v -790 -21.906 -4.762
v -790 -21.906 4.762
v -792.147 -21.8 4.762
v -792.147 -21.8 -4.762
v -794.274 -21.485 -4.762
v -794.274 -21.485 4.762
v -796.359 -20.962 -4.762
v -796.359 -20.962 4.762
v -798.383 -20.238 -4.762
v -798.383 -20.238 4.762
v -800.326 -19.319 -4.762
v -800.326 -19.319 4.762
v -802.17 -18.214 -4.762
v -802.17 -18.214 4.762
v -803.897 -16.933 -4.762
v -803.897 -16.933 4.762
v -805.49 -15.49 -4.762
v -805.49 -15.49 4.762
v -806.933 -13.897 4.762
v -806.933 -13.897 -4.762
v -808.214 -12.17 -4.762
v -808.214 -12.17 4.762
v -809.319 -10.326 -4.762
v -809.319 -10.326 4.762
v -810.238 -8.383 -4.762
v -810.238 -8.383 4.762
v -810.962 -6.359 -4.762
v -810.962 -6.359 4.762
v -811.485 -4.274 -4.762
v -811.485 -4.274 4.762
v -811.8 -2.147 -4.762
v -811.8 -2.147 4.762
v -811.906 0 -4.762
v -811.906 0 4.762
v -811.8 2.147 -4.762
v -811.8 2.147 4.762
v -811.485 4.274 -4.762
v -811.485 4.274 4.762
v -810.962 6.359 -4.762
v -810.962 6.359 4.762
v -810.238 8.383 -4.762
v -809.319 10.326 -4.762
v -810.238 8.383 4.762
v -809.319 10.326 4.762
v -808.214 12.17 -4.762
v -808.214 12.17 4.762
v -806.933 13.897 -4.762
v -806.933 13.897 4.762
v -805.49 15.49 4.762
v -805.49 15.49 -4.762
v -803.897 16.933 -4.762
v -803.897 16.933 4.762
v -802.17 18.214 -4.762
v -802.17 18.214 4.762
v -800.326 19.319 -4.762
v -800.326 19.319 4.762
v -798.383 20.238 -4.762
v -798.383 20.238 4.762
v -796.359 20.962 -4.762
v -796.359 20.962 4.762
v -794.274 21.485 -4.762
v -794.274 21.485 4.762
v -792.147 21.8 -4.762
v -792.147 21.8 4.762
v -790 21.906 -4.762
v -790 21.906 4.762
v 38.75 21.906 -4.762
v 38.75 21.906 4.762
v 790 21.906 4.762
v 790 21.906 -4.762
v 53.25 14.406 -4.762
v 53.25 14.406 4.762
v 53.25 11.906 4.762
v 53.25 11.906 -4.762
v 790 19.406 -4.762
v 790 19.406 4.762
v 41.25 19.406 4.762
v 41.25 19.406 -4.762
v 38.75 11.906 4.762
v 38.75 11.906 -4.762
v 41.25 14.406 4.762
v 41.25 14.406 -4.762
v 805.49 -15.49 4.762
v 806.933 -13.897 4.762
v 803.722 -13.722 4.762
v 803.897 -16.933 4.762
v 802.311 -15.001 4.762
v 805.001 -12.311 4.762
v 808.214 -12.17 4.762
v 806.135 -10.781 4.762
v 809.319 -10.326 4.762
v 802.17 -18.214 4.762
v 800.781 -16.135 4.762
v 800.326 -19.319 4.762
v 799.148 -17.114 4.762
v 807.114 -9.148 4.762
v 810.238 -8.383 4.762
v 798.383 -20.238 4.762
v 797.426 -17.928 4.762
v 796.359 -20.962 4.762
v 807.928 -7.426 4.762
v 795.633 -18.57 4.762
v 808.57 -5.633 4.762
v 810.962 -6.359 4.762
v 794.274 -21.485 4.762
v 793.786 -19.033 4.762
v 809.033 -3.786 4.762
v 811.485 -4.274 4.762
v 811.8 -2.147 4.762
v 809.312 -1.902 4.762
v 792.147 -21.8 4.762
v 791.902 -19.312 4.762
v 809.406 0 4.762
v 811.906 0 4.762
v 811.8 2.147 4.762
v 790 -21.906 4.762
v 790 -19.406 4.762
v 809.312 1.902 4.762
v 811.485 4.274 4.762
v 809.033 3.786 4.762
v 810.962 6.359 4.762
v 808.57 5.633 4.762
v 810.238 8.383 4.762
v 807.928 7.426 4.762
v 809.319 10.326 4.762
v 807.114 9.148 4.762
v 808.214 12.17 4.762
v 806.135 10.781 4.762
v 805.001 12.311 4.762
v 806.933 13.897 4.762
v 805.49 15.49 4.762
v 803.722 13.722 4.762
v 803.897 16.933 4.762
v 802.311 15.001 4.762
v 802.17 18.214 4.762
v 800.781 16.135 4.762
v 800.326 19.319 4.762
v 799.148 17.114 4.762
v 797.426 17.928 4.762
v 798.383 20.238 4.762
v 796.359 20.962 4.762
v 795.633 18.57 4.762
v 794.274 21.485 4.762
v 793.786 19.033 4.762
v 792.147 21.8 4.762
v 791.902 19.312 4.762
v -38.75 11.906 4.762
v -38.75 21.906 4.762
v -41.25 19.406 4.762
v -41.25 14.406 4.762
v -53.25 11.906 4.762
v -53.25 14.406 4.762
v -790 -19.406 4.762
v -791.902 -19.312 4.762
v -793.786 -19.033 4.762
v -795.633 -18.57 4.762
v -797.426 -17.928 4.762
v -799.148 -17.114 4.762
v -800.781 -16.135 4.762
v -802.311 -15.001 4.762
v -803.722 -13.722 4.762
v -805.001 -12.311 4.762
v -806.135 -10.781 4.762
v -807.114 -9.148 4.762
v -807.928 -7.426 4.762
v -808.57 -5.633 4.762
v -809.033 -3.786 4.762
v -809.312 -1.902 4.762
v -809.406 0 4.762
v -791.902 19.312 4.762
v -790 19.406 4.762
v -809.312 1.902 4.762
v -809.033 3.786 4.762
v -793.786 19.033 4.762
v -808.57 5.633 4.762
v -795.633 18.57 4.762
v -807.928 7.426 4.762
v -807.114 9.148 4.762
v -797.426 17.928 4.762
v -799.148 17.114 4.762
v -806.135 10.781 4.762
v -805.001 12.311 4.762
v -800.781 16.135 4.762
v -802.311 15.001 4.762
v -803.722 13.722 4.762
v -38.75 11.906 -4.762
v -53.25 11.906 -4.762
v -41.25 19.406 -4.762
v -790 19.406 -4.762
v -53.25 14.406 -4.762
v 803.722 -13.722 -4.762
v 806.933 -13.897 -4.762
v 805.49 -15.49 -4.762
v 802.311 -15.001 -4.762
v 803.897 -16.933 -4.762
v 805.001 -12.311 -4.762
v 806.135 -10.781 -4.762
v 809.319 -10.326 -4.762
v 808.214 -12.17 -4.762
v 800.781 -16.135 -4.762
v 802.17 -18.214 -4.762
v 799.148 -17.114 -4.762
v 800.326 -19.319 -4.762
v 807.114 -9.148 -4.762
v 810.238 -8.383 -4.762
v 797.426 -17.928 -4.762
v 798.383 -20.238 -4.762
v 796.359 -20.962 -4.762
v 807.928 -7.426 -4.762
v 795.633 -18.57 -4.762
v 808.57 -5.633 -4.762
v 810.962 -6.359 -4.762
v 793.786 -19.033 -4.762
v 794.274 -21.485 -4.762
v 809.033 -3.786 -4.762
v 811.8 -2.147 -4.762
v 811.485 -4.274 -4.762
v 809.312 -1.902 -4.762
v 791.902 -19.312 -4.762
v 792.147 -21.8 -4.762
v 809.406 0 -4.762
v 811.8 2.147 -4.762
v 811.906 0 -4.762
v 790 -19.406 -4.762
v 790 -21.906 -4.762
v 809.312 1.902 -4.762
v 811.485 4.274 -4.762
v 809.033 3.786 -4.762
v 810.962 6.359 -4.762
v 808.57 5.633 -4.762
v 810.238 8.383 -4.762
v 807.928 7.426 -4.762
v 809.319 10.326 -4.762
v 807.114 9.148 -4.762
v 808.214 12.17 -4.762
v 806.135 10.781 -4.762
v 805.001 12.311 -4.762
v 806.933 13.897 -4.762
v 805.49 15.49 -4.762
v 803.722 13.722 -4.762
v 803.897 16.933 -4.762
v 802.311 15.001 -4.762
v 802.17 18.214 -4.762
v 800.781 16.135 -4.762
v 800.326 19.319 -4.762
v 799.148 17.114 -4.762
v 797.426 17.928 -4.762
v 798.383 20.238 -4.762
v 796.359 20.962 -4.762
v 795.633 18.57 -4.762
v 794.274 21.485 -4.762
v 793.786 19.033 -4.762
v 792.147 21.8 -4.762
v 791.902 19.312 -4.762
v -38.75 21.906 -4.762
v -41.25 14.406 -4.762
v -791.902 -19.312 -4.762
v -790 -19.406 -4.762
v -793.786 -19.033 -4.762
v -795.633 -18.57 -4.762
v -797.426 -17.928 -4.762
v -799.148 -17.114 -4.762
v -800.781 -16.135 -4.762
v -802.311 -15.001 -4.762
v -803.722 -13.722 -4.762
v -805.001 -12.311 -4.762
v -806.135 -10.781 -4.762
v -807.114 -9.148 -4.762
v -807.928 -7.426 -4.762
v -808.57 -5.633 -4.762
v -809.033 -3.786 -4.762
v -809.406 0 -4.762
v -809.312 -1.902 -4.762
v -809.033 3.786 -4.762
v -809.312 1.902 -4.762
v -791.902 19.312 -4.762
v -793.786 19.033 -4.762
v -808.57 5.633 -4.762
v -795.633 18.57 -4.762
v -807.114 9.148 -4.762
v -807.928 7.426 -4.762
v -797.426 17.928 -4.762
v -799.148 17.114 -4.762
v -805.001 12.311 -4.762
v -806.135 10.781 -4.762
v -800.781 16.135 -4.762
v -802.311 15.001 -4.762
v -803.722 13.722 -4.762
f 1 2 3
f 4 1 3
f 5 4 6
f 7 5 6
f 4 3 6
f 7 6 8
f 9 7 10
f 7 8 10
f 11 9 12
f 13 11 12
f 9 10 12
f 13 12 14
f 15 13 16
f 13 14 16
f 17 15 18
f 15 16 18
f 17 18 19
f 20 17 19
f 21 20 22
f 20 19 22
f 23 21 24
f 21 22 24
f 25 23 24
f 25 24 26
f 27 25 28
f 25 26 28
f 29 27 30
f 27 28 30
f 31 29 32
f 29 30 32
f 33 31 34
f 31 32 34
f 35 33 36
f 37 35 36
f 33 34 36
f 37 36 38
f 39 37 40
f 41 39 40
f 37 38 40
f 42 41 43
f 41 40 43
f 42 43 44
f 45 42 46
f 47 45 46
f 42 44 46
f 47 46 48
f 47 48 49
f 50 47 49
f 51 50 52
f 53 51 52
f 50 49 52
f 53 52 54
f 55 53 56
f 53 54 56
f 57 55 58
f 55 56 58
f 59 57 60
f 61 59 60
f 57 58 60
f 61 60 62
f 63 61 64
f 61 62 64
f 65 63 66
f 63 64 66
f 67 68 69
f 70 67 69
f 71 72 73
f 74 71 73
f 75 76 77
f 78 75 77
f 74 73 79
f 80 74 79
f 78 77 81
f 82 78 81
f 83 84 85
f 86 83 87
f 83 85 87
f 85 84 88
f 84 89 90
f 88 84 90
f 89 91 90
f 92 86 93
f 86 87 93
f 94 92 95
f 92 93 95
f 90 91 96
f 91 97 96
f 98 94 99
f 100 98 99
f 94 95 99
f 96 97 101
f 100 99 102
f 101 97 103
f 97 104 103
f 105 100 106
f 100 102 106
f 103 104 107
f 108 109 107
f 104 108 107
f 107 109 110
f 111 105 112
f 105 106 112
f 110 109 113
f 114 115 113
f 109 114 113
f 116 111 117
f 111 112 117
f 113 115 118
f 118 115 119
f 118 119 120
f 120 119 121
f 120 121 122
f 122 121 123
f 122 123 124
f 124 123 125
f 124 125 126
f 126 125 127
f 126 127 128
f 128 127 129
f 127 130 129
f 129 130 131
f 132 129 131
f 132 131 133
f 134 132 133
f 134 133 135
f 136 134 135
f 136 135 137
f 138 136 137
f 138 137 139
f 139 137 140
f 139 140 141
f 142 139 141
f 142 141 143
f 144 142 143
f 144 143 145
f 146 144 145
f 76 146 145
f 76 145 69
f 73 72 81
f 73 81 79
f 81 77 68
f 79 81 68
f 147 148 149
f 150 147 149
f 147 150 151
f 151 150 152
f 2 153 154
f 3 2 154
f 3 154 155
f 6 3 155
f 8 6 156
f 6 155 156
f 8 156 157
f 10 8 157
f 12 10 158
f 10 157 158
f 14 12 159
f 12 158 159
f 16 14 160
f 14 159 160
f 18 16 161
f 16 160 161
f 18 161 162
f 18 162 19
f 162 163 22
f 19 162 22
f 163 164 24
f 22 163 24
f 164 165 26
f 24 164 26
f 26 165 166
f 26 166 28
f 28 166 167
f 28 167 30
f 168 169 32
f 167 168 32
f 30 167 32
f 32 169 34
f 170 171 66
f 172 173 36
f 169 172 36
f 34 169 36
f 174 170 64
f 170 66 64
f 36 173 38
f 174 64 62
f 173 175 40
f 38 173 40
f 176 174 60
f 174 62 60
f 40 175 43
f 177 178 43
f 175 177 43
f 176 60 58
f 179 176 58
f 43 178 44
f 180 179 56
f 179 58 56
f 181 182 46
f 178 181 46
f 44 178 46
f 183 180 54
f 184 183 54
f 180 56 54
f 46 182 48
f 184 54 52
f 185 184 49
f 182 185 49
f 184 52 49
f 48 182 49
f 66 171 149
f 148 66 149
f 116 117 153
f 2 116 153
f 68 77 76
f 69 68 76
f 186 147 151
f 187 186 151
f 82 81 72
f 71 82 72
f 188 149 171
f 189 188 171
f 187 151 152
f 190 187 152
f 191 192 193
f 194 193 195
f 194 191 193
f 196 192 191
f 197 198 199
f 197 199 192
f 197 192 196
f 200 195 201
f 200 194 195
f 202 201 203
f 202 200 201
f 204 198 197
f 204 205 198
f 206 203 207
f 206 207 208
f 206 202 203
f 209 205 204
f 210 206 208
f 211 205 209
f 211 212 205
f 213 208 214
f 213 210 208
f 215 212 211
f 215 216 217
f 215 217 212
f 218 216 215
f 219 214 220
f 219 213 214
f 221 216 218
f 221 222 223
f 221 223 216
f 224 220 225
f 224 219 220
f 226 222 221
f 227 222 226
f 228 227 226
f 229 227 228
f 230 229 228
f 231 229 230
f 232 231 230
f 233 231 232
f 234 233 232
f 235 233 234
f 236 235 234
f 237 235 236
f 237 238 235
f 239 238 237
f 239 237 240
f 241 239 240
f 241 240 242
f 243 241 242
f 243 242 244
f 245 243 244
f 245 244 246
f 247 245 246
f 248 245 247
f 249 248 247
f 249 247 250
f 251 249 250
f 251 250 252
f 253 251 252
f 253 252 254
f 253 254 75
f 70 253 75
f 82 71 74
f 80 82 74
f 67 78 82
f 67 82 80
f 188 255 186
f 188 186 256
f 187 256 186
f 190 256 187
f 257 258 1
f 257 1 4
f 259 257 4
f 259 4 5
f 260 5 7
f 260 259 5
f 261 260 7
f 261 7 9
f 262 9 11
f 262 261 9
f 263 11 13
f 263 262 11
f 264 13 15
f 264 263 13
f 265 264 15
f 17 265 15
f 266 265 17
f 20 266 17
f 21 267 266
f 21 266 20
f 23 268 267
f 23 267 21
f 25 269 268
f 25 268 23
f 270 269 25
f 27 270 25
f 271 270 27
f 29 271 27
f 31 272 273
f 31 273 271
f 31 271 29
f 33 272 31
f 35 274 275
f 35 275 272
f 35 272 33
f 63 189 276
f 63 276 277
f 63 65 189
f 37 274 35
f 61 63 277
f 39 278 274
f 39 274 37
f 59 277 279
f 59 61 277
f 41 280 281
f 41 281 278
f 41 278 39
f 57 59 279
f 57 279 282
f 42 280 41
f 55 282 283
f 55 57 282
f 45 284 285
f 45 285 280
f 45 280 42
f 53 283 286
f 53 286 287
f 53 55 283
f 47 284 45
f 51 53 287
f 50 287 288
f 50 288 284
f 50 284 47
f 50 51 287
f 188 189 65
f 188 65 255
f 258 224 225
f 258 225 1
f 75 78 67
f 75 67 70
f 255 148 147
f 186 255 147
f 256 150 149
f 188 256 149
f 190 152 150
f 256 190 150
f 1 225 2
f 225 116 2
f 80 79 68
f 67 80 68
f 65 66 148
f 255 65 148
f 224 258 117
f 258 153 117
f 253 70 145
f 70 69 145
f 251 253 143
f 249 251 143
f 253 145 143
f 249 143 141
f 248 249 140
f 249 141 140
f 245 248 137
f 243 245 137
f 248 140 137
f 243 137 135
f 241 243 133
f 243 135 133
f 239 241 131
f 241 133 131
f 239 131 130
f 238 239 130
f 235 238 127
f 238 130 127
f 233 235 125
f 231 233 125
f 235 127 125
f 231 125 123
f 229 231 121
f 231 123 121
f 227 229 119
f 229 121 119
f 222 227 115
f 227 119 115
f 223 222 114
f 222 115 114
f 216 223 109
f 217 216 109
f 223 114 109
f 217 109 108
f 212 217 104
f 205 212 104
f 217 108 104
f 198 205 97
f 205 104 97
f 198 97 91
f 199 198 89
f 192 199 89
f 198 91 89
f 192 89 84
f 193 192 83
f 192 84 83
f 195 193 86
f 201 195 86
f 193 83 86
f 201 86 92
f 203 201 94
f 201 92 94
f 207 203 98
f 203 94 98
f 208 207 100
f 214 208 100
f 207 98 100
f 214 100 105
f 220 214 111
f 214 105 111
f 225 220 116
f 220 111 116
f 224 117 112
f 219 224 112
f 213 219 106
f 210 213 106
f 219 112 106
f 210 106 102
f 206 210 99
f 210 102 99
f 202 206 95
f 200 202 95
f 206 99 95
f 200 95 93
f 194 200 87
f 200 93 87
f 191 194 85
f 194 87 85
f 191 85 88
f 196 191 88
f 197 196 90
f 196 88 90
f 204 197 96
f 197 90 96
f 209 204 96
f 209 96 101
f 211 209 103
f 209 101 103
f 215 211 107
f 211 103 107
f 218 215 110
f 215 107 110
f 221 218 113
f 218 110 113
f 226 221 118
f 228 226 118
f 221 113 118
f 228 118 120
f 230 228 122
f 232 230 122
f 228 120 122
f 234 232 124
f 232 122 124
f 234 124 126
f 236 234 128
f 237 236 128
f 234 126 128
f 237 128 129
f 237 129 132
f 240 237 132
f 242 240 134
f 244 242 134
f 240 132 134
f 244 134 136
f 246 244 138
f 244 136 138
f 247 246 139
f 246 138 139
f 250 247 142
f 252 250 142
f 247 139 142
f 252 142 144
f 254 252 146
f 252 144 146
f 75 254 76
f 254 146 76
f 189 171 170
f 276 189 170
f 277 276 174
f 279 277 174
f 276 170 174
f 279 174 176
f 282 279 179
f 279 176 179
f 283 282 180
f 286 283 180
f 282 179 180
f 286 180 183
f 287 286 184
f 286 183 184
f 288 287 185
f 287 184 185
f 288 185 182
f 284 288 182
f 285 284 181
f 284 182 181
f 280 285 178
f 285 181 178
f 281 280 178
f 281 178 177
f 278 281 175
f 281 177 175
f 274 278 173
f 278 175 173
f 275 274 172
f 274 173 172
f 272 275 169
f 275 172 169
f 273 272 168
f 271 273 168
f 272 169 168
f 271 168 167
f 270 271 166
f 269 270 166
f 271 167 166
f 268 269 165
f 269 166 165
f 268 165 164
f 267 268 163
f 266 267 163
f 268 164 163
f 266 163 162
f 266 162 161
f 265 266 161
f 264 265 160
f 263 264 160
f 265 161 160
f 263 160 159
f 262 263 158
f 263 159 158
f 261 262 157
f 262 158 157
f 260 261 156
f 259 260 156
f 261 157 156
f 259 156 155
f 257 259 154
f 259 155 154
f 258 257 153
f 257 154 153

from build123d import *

# Parameters (mm, degrees)
BOSS_EXTRUDE1_DEPTH = 4.7625
SKETCH2_W           = 80
SKETCH2_H           = 2.5
CUT_EXTRUDE1_DEPTH  = 4.7625
BOSS_EXTRUDE2_DEPTH = 9.525


with BuildPart() as part:
    # Sketch1 → Boss-Extrude1 (new, symmetric)
    with BuildSketch(Plane.XY):
        with BuildLine():
            Line((-790, 21.9056), (790, 21.9056))
            ThreePointArc((790, 21.9056), (811.9056, 0), (790, -21.9056))
            Line((790, -21.9056), (-790, -21.9056))
            ThreePointArc((-790, -21.9056), (-811.9056, 0), (-790, 21.9056))
        make_face()
        with BuildLine():
            Line((-790, -19.4056), (790, -19.4056))
            ThreePointArc((790, -19.4056), (809.4056, 0), (790, 19.4056))
            Line((790, 19.4056), (-790, 19.4056))
            ThreePointArc((-790, 19.4056), (-809.4056, 0), (-790, -19.4056))
        make_face(mode=Mode.SUBTRACT)
    extrude(amount=BOSS_EXTRUDE1_DEPTH, both=True)

    # Sketch2 → Cut-Extrude1 (cut, symmetric)
    with BuildSketch(Plane.XY):
        with Locations((0, 20.6556)):
            Rectangle(SKETCH2_W, SKETCH2_H)
    extrude(amount=CUT_EXTRUDE1_DEPTH, both=True, mode=Mode.SUBTRACT)

    # Sketch3 → Boss-Extrude2 (add)
    with BuildSketch(Plane.XY.offset(4.7625)):
        Polygon((-41.25, 21.9056), (-38.75, 21.9056), (-38.75, 11.9056), (-53.25, 11.9056), (-53.25, 14.4056), (-41.25, 14.4056), align=None)
        Polygon((53.25, 11.9056), (38.75, 11.9056), (38.75, 21.9056), (41.25, 21.9056), (41.25, 14.4056), (53.25, 14.4056), align=None)
    extrude(amount=-BOSS_EXTRUDE2_DEPTH)


solid = part.part
